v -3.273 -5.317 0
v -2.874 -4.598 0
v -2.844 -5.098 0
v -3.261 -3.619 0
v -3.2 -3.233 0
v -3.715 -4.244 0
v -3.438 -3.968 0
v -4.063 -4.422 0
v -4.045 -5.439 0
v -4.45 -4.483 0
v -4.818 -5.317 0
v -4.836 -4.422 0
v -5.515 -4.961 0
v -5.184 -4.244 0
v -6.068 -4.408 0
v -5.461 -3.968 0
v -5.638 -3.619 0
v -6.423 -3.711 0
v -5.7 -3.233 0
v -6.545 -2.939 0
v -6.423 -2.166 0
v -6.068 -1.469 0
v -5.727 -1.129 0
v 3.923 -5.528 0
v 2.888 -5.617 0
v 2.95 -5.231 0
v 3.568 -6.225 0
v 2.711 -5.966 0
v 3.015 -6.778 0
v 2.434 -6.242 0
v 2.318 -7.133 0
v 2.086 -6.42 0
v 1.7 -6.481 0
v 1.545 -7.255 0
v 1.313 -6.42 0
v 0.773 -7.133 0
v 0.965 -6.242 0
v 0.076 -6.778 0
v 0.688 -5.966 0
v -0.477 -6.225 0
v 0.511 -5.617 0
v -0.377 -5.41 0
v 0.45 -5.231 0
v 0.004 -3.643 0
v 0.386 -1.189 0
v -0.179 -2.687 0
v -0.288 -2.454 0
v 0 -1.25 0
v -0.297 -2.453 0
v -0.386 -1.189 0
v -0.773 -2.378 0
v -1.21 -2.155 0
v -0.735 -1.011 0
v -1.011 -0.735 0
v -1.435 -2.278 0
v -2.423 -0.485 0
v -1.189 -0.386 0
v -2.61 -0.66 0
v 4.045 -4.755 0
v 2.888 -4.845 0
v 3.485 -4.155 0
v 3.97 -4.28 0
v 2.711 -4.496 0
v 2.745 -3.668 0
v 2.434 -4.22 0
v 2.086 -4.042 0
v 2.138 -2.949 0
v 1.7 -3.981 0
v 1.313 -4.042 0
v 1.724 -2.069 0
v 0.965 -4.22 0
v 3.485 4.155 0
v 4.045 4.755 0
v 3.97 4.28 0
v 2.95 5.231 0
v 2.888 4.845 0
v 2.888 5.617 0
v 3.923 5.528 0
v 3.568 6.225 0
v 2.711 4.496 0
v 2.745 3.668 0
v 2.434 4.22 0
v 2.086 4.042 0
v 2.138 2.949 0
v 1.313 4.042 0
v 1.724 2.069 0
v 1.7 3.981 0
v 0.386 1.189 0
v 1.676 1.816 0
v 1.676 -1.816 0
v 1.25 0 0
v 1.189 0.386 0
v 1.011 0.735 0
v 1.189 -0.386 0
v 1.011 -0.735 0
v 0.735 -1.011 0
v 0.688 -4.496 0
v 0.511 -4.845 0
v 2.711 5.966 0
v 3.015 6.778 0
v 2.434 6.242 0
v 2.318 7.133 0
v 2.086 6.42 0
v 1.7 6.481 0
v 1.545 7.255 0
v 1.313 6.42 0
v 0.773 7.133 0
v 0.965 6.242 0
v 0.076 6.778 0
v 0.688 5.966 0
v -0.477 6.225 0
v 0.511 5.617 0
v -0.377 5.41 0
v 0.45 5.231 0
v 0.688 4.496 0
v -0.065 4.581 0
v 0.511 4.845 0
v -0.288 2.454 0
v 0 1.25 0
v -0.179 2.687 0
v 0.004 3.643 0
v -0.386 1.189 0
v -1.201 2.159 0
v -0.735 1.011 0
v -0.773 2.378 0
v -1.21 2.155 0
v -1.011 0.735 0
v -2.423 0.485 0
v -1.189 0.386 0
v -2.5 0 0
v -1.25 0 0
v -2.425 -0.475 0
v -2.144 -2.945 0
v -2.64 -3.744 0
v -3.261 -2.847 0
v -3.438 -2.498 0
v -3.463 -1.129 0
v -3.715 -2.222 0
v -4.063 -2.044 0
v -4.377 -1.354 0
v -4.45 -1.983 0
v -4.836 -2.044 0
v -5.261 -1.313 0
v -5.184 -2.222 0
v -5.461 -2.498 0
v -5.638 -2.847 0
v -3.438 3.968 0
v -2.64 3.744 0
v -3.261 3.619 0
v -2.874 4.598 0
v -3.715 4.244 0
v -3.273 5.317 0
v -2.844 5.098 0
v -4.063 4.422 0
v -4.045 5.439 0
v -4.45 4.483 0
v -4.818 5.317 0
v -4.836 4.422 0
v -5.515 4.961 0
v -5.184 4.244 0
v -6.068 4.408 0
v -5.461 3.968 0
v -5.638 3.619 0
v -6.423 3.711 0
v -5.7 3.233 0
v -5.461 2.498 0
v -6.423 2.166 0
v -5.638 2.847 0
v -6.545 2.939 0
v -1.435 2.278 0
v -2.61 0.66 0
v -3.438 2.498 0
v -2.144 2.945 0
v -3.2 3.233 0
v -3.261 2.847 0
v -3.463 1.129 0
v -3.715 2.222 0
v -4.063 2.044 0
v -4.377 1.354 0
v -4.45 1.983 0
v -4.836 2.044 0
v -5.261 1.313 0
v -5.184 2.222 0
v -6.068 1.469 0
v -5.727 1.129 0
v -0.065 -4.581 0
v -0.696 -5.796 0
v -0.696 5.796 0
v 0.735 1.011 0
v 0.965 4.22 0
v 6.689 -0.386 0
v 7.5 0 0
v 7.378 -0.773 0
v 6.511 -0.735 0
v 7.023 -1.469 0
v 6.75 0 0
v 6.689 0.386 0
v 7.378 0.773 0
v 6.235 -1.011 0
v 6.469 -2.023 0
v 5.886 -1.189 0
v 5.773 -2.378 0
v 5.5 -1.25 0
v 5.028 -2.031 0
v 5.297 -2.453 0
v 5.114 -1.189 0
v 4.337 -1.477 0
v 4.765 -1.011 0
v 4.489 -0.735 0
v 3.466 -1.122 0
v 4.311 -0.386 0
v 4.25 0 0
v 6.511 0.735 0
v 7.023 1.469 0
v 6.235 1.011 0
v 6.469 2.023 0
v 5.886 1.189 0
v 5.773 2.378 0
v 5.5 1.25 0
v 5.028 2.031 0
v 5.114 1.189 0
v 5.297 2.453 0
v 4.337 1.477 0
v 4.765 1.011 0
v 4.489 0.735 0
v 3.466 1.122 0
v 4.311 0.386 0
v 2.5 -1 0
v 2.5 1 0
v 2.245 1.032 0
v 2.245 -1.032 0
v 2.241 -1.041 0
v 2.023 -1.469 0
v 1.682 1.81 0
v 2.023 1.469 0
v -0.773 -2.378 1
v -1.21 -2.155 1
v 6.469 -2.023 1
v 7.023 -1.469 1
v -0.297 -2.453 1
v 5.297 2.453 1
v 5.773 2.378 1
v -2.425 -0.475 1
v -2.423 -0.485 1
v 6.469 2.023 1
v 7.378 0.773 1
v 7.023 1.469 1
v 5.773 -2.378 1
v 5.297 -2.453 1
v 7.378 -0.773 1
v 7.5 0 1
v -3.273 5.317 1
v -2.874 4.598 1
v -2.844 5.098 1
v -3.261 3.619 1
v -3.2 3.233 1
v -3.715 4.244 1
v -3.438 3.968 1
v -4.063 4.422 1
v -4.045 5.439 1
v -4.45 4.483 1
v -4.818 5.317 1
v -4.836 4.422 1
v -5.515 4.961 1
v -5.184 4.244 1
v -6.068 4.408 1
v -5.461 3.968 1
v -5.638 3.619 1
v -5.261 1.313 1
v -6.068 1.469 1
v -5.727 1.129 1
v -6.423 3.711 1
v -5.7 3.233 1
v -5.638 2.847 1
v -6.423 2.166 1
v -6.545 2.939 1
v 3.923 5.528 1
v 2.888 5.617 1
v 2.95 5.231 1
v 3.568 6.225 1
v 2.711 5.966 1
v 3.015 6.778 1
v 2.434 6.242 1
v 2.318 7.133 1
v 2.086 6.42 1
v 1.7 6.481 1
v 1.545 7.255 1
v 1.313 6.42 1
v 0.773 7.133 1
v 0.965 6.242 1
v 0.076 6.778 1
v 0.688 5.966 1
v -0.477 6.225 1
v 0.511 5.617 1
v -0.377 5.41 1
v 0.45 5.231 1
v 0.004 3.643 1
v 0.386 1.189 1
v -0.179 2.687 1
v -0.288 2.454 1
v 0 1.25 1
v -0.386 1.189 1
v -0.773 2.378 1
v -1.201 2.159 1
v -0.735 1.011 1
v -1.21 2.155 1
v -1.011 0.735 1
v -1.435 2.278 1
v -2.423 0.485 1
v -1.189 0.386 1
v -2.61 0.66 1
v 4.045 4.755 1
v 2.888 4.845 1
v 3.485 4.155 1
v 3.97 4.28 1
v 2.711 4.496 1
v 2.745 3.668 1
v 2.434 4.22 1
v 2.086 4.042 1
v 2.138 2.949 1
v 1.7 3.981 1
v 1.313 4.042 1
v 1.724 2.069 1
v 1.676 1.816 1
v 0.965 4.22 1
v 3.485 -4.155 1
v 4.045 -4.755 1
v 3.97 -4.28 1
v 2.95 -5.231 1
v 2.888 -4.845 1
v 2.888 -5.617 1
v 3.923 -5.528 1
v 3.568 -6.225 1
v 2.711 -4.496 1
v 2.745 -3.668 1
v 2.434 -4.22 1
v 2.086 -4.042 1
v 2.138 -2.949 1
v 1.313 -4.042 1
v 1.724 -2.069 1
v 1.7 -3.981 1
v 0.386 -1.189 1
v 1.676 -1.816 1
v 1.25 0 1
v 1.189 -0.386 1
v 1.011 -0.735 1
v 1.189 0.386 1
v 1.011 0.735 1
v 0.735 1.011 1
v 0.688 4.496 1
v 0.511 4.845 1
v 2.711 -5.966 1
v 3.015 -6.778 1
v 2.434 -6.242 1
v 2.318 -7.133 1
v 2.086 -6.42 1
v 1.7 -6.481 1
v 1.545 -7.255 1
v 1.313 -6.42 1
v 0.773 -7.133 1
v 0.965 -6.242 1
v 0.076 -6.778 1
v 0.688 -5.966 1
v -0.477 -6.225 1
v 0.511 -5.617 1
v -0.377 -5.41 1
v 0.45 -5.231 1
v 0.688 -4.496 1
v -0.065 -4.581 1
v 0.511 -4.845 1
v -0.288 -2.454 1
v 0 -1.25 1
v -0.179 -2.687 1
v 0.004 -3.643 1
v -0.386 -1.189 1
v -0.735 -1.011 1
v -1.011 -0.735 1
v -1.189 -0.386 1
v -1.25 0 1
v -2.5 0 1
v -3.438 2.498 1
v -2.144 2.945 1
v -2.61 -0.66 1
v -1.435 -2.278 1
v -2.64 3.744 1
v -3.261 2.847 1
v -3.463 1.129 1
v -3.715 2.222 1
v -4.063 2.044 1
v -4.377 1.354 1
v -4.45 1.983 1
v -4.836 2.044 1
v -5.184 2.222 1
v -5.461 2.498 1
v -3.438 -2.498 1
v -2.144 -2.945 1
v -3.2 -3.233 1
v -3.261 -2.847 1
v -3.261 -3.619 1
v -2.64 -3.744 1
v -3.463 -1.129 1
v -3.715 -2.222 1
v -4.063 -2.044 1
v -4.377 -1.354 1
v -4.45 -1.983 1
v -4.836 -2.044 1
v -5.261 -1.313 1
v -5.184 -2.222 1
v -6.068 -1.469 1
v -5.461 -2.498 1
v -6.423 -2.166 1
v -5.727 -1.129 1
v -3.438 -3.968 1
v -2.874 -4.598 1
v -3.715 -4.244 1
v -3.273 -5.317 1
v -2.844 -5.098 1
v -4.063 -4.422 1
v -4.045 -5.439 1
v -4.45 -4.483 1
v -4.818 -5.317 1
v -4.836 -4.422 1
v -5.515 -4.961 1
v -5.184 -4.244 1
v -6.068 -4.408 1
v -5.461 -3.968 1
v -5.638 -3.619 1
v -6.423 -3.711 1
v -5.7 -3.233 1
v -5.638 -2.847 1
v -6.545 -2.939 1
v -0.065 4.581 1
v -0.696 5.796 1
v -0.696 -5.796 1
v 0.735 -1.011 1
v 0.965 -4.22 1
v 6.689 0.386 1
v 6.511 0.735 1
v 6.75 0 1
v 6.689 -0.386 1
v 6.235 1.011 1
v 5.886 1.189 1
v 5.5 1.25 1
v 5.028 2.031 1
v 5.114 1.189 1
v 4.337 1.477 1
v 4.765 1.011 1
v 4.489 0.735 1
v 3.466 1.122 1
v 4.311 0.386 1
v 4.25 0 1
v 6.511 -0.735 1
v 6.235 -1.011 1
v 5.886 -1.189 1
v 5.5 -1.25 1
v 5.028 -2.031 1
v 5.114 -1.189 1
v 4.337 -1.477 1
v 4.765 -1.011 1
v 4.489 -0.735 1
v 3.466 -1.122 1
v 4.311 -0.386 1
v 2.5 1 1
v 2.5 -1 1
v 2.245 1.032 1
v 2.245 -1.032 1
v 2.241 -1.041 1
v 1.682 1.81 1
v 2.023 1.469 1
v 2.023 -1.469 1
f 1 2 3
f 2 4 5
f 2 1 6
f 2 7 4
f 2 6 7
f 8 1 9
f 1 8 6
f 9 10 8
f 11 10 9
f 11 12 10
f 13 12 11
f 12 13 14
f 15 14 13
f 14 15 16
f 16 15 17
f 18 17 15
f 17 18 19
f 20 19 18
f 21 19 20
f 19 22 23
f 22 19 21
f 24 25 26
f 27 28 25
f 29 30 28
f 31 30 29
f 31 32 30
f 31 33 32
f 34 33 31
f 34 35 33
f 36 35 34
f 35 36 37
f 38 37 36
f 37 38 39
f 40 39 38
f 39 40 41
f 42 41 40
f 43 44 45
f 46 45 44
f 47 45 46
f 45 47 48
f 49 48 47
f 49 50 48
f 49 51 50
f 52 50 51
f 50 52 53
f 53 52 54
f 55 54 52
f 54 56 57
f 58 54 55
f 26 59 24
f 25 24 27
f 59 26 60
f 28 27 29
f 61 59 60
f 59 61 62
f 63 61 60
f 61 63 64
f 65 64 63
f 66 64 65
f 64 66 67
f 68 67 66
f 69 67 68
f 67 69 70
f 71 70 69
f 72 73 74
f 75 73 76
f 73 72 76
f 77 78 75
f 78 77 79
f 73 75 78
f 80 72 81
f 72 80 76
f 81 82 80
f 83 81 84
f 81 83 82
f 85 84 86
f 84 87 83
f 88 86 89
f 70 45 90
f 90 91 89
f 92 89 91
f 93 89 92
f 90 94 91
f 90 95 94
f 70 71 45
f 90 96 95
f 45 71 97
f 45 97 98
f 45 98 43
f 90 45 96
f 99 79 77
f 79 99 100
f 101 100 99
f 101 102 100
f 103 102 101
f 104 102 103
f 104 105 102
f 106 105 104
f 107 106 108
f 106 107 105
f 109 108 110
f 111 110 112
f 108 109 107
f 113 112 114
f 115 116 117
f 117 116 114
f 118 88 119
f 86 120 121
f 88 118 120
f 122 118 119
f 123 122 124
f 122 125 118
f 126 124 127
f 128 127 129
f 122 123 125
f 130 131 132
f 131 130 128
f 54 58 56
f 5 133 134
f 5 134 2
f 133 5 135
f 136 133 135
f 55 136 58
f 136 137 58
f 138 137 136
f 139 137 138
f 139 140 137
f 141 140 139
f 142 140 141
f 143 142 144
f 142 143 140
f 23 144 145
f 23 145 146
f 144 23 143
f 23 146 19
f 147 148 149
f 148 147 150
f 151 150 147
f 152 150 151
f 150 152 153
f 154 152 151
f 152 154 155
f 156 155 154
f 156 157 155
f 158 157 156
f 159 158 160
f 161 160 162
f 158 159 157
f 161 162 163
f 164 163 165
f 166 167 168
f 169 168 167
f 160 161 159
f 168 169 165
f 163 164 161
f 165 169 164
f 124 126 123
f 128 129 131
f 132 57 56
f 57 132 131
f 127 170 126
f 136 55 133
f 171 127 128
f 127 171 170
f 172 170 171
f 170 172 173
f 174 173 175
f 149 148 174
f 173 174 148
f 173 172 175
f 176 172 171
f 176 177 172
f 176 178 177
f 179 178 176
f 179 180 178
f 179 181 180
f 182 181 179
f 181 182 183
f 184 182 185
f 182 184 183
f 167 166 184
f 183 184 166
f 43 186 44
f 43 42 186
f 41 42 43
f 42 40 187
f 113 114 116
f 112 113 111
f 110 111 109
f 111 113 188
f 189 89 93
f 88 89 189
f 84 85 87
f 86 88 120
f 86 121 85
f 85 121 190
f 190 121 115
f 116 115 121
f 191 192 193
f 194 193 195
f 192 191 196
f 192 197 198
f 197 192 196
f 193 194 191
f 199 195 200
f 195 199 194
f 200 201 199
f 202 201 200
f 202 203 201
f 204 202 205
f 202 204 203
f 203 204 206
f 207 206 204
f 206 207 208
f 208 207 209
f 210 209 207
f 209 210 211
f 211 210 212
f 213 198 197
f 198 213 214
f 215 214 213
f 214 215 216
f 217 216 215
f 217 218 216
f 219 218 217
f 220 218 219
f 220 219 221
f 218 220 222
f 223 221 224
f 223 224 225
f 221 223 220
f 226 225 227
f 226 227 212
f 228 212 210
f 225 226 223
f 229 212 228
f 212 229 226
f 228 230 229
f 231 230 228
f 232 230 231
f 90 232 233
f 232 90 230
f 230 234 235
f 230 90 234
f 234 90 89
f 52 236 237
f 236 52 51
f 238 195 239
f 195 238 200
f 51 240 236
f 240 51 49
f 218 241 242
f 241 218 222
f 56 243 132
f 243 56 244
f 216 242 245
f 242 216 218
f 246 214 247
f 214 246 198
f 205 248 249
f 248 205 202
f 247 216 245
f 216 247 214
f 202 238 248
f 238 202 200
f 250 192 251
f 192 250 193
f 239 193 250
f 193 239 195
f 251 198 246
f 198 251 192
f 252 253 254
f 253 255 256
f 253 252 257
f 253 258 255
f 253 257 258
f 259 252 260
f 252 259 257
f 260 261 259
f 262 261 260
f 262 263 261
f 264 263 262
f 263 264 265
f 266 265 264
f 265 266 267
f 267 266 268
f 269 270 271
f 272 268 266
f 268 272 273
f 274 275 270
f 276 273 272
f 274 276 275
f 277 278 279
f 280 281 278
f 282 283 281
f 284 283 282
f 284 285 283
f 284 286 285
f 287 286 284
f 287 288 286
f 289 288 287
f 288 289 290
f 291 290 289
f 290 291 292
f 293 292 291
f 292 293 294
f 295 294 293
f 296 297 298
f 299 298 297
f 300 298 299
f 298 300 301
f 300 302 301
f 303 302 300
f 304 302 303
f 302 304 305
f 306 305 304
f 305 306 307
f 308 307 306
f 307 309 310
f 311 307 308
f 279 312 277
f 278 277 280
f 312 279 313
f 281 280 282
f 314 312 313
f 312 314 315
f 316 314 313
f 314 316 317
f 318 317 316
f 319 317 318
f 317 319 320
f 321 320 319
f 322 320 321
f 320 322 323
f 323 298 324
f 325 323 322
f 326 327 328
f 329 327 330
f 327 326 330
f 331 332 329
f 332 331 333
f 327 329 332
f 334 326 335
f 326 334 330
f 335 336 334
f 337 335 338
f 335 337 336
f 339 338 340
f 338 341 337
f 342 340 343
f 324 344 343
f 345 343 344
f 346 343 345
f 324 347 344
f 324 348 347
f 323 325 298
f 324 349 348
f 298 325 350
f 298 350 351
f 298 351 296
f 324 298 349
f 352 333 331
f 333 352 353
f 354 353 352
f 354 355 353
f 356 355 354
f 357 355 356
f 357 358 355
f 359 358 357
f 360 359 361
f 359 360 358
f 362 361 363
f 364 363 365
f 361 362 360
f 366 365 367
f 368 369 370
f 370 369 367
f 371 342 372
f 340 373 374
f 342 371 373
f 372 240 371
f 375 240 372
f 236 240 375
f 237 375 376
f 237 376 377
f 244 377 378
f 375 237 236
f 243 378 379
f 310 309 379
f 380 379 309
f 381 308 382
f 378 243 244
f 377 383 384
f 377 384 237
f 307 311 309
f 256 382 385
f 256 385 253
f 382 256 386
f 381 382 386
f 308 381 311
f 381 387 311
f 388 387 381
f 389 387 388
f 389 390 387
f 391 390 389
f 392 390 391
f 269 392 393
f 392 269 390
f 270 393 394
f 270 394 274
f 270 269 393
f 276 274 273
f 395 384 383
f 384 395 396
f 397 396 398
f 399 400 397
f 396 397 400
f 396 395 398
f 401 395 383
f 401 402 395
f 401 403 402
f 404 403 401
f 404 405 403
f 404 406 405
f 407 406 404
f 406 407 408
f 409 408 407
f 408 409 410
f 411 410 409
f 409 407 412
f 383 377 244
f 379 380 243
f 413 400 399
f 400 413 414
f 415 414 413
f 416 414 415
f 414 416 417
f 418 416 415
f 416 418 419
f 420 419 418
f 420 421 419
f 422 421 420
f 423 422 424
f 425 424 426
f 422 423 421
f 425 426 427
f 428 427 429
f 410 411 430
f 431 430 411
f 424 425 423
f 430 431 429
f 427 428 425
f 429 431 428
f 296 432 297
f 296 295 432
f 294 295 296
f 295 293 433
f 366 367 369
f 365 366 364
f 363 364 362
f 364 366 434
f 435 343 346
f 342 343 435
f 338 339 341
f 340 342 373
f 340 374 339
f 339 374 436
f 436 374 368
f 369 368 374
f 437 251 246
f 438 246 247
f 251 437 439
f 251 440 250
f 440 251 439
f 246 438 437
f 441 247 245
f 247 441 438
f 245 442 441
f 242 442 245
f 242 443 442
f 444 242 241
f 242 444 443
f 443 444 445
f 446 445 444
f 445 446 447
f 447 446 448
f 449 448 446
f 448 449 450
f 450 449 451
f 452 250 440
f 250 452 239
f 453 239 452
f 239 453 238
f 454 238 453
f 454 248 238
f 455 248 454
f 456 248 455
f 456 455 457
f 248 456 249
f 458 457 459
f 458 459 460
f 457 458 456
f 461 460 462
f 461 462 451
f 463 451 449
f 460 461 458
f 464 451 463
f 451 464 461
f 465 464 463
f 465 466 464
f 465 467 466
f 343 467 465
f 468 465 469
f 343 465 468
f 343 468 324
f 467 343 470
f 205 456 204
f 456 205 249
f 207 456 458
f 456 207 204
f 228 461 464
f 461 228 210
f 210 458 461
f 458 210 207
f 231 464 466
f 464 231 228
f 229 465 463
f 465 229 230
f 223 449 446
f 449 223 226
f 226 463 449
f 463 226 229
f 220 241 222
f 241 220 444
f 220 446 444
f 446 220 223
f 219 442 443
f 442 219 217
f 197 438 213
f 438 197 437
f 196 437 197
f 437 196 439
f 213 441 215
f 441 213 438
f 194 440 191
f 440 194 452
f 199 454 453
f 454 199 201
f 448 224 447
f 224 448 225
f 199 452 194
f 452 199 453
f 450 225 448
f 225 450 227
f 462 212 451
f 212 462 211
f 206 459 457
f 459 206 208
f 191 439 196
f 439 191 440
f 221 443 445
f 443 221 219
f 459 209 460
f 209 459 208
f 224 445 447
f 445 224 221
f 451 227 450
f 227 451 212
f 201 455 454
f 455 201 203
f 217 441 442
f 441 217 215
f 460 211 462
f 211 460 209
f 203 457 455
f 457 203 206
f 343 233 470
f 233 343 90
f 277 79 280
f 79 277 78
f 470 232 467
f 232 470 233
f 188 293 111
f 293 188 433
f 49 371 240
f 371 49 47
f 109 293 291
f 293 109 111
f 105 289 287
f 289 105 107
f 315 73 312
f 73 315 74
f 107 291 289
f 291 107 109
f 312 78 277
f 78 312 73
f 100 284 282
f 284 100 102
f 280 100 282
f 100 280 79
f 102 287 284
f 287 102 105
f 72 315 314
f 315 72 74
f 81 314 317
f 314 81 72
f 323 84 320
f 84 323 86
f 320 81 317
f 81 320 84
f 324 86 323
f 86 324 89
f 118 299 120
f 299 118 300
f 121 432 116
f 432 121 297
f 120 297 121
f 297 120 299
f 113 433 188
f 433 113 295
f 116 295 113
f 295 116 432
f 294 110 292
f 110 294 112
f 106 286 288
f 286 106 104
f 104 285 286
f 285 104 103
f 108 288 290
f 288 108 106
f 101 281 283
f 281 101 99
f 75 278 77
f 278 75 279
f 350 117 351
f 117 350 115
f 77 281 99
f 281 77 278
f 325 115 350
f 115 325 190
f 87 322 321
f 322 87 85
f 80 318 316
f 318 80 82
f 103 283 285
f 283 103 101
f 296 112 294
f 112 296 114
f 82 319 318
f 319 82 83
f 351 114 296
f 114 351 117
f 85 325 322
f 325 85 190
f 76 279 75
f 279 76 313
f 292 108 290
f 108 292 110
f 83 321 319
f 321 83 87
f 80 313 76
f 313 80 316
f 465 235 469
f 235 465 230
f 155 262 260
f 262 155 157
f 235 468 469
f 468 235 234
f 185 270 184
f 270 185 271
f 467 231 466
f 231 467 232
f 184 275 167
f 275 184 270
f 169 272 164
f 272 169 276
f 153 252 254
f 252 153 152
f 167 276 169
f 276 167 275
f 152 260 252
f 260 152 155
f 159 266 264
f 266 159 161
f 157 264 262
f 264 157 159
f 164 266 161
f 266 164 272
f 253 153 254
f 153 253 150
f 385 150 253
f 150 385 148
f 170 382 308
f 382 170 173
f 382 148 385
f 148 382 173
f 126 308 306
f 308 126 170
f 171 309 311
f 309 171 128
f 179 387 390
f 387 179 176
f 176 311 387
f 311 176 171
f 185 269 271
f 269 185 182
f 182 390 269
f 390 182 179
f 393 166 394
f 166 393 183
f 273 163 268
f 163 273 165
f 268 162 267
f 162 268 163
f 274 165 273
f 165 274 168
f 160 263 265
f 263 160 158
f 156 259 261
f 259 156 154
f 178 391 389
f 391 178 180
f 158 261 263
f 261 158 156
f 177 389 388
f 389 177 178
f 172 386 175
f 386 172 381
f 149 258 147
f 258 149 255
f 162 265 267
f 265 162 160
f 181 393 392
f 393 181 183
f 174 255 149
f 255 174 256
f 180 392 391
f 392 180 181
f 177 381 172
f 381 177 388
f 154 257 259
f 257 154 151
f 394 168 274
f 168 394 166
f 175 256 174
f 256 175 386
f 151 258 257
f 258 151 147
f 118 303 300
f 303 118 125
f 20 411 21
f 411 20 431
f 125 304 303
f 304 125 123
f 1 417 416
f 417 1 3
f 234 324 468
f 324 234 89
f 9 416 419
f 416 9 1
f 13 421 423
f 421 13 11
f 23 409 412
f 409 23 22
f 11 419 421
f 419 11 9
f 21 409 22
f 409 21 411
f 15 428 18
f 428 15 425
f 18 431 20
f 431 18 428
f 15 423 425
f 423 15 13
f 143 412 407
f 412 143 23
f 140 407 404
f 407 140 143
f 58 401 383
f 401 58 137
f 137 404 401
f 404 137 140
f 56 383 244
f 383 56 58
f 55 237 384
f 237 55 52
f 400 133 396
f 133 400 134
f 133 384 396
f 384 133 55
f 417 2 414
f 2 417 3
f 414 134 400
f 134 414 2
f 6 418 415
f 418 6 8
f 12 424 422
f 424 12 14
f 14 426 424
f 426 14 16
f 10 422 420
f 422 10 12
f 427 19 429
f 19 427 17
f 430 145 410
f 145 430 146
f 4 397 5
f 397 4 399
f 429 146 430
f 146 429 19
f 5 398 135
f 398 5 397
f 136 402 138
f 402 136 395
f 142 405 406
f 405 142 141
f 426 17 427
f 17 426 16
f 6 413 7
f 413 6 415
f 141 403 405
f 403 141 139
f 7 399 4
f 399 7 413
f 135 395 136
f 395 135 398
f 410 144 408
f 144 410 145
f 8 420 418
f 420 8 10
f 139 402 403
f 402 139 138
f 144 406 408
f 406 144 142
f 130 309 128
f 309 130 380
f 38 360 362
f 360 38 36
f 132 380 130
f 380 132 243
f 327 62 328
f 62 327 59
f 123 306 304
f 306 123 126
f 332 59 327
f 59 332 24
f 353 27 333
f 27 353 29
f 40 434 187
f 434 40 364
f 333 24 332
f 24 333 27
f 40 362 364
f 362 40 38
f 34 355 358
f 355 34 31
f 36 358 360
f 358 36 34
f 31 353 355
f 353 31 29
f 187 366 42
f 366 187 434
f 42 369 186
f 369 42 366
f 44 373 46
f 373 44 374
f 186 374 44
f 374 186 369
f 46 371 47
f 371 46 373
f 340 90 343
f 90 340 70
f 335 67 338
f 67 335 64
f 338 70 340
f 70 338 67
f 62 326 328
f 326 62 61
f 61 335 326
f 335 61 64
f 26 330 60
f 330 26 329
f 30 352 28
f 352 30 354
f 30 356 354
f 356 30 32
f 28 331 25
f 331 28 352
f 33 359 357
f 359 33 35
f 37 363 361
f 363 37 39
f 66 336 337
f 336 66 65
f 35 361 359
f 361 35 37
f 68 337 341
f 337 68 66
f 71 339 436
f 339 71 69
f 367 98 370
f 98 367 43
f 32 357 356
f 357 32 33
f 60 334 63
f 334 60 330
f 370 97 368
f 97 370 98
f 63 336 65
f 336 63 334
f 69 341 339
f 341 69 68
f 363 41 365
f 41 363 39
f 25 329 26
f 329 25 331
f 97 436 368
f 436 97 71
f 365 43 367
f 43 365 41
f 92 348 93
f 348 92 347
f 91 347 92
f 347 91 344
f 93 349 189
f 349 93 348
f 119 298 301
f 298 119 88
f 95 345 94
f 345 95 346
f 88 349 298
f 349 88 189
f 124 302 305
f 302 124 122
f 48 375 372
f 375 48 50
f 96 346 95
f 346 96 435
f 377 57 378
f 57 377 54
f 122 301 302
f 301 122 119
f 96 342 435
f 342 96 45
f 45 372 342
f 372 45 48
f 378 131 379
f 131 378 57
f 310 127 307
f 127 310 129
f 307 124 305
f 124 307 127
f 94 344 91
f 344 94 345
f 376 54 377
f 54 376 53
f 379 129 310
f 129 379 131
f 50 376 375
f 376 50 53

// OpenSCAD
$fn=20;

module arm(length=5, width=5, cut_scale = [1.5, .75, 1], bearing_size=2.5) {
    cutout=cut_scale[1];
    translate([0, -width/2, 0])
    difference() {
        hull() {
            translate([0, width/2, 0]) cylinder(h=1, d=5);
            translate([length, width/2, 0]) cylinder(h=1, d=5);    
        }
        translate([length/2, -cutout, -.5]) 
            scale(cut_scale) 
                cylinder(h=2, d=5);
        translate([length/2, width+cutout, -.5]) 
            scale(cut_scale)
                cylinder(h=2, d=5);
        
        translate([length+.5, width/2, -.5]) 
            cylinder(h=2,d=bearing_size);
    }
}

module fidgit_spinner(cnt_arms=3,length=5, width=5, cut_scale = [1.5, .75, 1], bearing_size=2.5) {
    difference() {
        for (i=[0:360/cnt_arms:360]) {
            rotate([0,0,i]) arm(length, width, cut_scale, bearing_size);
        }
        translate([0,0,-.5]) cylinder(h=2,d=bearing_size);
    }
}
fidgit_spinner(cnt_arms=5, cut_scale=[1.25, 1, 1]);
//arm();
